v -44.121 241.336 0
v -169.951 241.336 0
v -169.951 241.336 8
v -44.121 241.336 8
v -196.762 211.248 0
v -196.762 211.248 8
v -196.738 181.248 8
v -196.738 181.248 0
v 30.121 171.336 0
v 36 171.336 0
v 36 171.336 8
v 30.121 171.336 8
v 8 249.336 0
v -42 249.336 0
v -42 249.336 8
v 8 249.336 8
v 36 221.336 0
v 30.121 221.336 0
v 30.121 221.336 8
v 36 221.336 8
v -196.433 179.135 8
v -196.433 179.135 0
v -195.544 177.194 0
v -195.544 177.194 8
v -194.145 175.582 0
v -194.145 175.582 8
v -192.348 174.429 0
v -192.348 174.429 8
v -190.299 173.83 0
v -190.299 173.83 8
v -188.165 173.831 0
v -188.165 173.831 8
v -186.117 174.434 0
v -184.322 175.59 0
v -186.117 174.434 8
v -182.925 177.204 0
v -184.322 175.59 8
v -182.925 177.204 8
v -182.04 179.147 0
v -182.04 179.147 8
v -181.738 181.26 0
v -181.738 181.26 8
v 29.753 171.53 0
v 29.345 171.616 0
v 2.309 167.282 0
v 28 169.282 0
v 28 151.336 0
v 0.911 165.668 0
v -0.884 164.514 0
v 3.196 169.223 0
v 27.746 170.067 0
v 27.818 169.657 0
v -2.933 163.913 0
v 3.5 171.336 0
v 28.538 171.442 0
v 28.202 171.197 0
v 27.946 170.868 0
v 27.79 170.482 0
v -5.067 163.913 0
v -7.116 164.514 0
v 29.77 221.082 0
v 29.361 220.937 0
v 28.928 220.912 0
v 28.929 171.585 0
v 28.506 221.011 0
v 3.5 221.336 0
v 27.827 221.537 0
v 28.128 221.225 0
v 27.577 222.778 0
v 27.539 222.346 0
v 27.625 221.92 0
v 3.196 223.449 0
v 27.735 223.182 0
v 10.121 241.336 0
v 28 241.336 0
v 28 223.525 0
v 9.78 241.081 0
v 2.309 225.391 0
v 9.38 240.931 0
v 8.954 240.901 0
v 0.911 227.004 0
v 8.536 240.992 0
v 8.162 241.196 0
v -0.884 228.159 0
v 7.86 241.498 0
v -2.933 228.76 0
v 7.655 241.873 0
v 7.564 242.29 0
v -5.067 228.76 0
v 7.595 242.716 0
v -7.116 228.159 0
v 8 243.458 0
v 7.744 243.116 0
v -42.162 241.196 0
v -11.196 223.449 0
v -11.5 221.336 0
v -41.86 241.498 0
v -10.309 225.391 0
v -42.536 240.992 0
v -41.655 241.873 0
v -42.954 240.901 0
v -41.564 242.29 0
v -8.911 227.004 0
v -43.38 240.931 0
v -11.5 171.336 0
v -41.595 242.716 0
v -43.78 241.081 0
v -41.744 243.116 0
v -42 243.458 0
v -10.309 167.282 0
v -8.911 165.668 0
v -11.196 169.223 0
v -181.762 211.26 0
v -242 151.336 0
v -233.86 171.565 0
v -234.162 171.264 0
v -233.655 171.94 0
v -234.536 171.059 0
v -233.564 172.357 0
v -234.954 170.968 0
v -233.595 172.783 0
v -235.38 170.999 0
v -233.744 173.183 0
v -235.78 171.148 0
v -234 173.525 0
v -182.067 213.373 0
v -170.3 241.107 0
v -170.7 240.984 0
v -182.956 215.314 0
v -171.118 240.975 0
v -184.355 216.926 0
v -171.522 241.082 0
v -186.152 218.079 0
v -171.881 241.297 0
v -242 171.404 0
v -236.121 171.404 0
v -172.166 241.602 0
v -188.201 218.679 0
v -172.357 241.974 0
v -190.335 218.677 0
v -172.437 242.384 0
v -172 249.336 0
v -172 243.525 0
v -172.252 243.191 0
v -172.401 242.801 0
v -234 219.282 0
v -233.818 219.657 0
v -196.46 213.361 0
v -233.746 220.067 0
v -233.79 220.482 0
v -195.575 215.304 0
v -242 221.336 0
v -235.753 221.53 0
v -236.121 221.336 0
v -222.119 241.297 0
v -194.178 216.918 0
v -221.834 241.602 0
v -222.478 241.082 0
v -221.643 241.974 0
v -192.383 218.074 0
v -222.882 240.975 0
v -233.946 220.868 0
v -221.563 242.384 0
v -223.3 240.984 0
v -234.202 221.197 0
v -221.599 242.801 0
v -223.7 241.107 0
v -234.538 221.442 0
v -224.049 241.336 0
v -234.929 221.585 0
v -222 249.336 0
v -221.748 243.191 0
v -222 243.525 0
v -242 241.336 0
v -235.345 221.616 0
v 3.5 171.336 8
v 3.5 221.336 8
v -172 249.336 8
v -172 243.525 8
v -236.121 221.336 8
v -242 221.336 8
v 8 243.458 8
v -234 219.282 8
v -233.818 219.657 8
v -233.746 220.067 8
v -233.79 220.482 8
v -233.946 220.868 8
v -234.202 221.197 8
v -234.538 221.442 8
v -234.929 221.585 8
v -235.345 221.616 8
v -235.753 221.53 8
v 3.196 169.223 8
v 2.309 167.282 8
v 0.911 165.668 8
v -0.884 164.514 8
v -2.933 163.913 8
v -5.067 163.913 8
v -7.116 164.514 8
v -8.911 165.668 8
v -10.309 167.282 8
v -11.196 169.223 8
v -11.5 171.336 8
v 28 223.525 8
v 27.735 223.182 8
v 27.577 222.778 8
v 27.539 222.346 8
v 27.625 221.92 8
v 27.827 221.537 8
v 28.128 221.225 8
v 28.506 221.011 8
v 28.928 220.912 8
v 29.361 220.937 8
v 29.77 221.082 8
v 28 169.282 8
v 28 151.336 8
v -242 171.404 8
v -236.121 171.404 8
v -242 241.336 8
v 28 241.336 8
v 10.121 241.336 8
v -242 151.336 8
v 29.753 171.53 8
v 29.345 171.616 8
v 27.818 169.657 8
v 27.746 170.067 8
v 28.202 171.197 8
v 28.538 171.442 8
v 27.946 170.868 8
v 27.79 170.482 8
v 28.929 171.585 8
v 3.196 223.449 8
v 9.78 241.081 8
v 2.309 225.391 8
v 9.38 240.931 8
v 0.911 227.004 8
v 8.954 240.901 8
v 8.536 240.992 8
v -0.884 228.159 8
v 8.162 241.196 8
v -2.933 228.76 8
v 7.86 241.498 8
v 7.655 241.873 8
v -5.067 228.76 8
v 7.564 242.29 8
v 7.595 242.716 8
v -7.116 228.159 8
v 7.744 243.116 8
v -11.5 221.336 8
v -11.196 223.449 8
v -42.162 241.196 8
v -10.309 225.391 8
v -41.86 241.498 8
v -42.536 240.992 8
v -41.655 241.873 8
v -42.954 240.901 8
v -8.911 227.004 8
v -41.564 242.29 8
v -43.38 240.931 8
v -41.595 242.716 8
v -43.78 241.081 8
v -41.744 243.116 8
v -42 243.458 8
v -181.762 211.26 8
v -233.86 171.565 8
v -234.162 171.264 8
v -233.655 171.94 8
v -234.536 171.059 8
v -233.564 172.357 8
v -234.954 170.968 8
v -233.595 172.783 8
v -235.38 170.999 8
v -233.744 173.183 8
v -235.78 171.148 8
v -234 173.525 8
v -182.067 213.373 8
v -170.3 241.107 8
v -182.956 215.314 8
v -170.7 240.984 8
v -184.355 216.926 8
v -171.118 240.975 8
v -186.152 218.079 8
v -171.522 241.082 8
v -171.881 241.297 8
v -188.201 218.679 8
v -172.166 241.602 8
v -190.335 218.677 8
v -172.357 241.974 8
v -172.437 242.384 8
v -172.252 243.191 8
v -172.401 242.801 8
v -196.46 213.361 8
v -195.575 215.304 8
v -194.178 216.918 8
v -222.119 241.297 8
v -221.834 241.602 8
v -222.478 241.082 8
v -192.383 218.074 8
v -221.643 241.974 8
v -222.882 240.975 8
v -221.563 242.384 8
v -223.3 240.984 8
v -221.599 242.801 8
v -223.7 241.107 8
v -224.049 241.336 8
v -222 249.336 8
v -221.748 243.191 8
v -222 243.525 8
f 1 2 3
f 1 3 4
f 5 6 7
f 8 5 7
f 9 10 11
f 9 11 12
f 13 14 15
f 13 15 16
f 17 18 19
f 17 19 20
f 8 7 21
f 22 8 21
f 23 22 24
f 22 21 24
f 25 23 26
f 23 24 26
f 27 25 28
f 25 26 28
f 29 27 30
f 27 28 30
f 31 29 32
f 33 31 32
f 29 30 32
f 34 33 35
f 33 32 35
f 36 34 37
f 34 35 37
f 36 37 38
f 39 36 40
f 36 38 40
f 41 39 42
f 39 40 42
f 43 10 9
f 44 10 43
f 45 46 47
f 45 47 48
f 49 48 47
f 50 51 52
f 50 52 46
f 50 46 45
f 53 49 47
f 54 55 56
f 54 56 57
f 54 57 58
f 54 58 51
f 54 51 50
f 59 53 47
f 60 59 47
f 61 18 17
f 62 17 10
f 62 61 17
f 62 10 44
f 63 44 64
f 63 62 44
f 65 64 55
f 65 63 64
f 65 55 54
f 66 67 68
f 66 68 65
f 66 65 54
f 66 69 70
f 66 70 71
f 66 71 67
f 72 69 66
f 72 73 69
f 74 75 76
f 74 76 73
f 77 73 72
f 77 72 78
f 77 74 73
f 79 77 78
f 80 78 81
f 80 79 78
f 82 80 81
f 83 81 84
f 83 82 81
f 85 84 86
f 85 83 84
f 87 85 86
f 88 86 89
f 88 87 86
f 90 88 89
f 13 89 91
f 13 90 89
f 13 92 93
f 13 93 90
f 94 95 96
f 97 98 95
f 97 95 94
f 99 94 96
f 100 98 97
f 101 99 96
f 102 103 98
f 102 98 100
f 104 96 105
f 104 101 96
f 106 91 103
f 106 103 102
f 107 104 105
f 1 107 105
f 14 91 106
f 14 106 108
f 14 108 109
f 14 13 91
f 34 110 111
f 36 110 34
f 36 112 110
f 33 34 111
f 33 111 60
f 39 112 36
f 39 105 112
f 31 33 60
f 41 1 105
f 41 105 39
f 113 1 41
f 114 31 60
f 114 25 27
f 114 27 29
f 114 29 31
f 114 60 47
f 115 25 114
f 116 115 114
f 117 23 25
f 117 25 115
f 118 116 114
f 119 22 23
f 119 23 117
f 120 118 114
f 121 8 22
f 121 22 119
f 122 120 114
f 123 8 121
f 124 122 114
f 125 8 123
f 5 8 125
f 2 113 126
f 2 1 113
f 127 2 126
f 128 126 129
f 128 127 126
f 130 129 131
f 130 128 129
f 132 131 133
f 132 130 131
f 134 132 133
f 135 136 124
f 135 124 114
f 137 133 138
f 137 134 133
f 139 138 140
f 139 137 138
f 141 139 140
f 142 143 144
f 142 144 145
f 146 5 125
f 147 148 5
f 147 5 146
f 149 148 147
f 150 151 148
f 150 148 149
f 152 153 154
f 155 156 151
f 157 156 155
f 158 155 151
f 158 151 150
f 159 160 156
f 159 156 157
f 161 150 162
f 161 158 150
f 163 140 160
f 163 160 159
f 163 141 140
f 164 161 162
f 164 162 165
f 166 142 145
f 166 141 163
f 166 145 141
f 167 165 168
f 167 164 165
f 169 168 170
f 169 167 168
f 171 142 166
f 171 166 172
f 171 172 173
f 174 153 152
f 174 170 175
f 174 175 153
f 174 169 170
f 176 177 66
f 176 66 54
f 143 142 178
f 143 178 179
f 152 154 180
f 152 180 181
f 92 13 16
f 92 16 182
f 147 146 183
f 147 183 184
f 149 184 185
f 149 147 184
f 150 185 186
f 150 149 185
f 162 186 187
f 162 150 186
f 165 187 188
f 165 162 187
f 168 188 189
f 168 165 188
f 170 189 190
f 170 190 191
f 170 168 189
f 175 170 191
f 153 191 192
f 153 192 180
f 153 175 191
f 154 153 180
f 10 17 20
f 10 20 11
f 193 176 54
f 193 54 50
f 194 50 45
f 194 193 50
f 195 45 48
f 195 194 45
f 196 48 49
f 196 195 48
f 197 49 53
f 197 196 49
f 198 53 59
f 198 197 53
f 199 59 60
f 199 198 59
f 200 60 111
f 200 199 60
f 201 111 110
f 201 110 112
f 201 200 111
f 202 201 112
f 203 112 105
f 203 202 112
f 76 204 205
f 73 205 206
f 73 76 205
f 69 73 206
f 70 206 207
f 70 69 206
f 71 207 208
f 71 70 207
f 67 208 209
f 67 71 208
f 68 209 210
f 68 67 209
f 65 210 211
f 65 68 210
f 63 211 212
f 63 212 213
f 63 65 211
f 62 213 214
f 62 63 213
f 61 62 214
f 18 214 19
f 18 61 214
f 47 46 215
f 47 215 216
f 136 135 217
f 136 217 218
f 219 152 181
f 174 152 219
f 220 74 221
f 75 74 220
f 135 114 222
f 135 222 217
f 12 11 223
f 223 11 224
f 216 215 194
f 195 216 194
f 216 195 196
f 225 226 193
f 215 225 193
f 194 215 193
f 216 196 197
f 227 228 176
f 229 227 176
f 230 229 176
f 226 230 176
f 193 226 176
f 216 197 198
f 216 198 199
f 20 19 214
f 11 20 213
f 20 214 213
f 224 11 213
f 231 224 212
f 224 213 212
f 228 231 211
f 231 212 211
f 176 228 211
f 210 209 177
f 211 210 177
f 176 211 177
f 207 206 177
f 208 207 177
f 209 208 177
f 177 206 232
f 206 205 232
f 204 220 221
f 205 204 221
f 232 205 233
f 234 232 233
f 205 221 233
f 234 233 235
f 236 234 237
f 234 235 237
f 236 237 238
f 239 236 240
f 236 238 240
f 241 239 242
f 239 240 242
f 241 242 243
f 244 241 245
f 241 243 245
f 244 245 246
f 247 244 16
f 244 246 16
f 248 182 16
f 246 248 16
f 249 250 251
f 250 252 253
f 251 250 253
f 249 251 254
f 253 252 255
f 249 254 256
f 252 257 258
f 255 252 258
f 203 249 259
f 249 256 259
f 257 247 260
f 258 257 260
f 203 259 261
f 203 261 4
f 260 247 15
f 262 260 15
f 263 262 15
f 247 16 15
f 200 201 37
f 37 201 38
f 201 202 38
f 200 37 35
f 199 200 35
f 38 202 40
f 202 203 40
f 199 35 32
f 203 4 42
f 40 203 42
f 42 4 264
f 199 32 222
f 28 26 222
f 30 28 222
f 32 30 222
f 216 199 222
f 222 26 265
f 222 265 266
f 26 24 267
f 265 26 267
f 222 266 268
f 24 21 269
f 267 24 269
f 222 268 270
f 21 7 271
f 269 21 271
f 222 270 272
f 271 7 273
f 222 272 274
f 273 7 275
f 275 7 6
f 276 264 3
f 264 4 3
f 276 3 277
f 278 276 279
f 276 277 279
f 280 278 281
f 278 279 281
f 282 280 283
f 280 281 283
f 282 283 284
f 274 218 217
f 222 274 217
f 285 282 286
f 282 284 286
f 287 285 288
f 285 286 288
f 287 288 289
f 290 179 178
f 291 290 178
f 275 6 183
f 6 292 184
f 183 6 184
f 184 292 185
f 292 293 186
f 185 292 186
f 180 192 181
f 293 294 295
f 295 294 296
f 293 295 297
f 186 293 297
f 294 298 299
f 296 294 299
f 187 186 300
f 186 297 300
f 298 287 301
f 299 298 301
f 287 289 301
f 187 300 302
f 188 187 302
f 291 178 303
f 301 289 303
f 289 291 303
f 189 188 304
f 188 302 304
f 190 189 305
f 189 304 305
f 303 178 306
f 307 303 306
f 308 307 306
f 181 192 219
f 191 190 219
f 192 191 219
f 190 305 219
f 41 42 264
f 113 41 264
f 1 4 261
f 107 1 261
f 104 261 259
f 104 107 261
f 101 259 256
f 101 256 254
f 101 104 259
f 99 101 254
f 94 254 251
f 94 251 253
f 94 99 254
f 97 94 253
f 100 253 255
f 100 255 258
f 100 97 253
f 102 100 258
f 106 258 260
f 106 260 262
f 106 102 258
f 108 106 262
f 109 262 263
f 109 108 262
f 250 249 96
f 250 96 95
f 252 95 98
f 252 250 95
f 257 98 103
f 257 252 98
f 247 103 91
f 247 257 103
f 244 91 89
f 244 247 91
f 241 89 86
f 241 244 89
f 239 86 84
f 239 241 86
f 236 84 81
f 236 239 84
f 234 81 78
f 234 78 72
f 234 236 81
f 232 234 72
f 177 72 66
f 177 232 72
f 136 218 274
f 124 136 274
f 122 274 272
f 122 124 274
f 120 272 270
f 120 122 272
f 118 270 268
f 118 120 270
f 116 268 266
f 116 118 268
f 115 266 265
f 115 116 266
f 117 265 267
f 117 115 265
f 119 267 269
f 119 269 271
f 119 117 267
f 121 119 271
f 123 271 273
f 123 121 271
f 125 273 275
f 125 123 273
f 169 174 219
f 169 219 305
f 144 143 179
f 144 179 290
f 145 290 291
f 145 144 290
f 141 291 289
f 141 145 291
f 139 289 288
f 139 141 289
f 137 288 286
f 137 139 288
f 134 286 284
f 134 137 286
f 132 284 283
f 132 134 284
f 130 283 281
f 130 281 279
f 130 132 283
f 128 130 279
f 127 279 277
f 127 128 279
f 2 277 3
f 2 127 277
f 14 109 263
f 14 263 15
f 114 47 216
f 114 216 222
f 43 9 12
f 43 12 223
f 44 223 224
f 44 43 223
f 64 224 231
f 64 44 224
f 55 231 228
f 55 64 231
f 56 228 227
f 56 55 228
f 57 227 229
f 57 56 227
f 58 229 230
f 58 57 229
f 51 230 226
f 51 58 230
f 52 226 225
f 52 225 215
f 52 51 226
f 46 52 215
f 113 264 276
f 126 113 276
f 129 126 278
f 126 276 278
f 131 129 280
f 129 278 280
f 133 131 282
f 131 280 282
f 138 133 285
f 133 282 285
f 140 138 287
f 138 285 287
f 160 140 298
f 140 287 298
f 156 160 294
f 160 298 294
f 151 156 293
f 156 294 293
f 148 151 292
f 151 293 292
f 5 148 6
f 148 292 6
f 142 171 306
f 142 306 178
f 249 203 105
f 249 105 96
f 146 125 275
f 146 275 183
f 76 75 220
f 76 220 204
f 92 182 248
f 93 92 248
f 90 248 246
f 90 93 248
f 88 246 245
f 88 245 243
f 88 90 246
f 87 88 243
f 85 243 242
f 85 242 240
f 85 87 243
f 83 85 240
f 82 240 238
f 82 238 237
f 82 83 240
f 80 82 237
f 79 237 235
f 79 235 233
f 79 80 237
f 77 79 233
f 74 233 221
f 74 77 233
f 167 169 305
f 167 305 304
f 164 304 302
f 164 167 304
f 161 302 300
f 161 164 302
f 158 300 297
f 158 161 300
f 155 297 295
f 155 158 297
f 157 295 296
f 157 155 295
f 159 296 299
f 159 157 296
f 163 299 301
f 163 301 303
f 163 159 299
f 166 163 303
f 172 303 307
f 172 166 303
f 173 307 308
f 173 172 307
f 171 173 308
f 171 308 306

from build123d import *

# Parameters (mm, degrees)
BOSS_EXTRU_1_DEPTH      = 8
ENL_V_MAT_EXTRU_1_DEPTH = 8


with BuildPart() as part:
    # Esquisse1 → Boss.-Extru.1 (new body)
    with BuildSketch(Plane.XY):
        with BuildLine():
            Line((30.121320344, 221.336361724), (36, 221.336361724))
            Line((36, 221.336361724), (36, 171.336361724))
            Line((36, 171.336361724), (30.121320344, 171.336361724))
            ThreePointArc((30.121320344, 171.336361724), (28.201672528, 171.196524964), (28, 169.282385406))
            Line((28, 169.282385406), (28, 151.336361724))
            Line((28, 151.336361724), (-242, 151.336361724))
            Line((-242, 151.336361724), (-242, 171.40370575))
            Line((-242, 171.40370575), (-236.121320344, 171.40370575))
            ThreePointArc((-236.121320344, 171.40370575), (-234, 171.40370575), (-234, 173.525026093))
            Line((-234, 173.525026093), (-234, 219.282385406))
            ThreePointArc((-234, 219.282385406), (-234.201672528, 221.196524964), (-236.121320344, 221.336361724))
            Line((-236.121320344, 221.336361724), (-242, 221.336361724))
            Line((-242, 221.336361724), (-242, 241.336361724))
            Line((-242, 241.336361724), (-224.049400042, 241.336361724))
            ThreePointArc((-224.049400042, 241.336361724), (-221.965737315, 241.439112813), (-222, 243.525026093))
            Line((-222, 243.525026093), (-222, 249.336361724))
            Line((-222, 249.336361724), (-172, 249.336361724))
            Line((-172, 249.336361724), (-172, 243.525026093))
            ThreePointArc((-172, 243.525026093), (-172.034262685, 241.439112813), (-169.950599958, 241.336361724))
            Line((-169.950599958, 241.336361724), (-44.121320344, 241.336361724))
            ThreePointArc((-44.121320344, 241.336361724), (-42, 241.336361724), (-42, 243.457682068))
            Line((-42, 243.457682068), (-42, 249.336361724))
            Line((-42, 249.336361724), (8, 249.336361724))
            Line((8, 249.336361724), (8, 243.457682068))
            ThreePointArc((8, 243.457682068), (8, 241.336361724), (10.121320344, 241.336361724))
            Line((10.121320344, 241.336361724), (28, 241.336361724))
            Line((28, 241.336361724), (28, 223.525026093))
            ThreePointArc((28, 223.525026093), (27.966327987, 221.370033737), (30.121320344, 221.336361724))
        make_face()
    extrude(amount=BOSS_EXTRU_1_DEPTH)

    # Esquisse2 → Enlèv. mat.-Extru.1 (cut)
    with BuildSketch(Plane.XY.offset(8)):
        with BuildLine():
            Line((3.5, 221.336361724), (3.5, 171.336361724))
            ThreePointArc((3.5, 171.336361724), (-4, 163.836361724), (-11.5, 171.336361724))
            Line((-11.5, 171.336361724), (-11.5, 221.336361724))
            ThreePointArc((-11.5, 221.336361724), (-4, 228.836361724), (3.5, 221.336361724))
        make_face()
        with BuildLine():
            Line((-196.761984324, 211.248045222), (-196.738010886, 181.248045222))
            ThreePointArc((-196.738010886, 181.248045222), (-189.232019924, 173.754040975), (-181.738015676, 181.260031937))
            Line((-181.738015676, 181.260031937), (-181.761989114, 211.260031937))
            ThreePointArc((-181.761989114, 211.260031937), (-189.267980076, 218.754036185), (-196.761984324, 211.248045222))
        make_face()
    extrude(amount=-ENL_V_MAT_EXTRU_1_DEPTH, mode=Mode.SUBTRACT)


solid = part.part
